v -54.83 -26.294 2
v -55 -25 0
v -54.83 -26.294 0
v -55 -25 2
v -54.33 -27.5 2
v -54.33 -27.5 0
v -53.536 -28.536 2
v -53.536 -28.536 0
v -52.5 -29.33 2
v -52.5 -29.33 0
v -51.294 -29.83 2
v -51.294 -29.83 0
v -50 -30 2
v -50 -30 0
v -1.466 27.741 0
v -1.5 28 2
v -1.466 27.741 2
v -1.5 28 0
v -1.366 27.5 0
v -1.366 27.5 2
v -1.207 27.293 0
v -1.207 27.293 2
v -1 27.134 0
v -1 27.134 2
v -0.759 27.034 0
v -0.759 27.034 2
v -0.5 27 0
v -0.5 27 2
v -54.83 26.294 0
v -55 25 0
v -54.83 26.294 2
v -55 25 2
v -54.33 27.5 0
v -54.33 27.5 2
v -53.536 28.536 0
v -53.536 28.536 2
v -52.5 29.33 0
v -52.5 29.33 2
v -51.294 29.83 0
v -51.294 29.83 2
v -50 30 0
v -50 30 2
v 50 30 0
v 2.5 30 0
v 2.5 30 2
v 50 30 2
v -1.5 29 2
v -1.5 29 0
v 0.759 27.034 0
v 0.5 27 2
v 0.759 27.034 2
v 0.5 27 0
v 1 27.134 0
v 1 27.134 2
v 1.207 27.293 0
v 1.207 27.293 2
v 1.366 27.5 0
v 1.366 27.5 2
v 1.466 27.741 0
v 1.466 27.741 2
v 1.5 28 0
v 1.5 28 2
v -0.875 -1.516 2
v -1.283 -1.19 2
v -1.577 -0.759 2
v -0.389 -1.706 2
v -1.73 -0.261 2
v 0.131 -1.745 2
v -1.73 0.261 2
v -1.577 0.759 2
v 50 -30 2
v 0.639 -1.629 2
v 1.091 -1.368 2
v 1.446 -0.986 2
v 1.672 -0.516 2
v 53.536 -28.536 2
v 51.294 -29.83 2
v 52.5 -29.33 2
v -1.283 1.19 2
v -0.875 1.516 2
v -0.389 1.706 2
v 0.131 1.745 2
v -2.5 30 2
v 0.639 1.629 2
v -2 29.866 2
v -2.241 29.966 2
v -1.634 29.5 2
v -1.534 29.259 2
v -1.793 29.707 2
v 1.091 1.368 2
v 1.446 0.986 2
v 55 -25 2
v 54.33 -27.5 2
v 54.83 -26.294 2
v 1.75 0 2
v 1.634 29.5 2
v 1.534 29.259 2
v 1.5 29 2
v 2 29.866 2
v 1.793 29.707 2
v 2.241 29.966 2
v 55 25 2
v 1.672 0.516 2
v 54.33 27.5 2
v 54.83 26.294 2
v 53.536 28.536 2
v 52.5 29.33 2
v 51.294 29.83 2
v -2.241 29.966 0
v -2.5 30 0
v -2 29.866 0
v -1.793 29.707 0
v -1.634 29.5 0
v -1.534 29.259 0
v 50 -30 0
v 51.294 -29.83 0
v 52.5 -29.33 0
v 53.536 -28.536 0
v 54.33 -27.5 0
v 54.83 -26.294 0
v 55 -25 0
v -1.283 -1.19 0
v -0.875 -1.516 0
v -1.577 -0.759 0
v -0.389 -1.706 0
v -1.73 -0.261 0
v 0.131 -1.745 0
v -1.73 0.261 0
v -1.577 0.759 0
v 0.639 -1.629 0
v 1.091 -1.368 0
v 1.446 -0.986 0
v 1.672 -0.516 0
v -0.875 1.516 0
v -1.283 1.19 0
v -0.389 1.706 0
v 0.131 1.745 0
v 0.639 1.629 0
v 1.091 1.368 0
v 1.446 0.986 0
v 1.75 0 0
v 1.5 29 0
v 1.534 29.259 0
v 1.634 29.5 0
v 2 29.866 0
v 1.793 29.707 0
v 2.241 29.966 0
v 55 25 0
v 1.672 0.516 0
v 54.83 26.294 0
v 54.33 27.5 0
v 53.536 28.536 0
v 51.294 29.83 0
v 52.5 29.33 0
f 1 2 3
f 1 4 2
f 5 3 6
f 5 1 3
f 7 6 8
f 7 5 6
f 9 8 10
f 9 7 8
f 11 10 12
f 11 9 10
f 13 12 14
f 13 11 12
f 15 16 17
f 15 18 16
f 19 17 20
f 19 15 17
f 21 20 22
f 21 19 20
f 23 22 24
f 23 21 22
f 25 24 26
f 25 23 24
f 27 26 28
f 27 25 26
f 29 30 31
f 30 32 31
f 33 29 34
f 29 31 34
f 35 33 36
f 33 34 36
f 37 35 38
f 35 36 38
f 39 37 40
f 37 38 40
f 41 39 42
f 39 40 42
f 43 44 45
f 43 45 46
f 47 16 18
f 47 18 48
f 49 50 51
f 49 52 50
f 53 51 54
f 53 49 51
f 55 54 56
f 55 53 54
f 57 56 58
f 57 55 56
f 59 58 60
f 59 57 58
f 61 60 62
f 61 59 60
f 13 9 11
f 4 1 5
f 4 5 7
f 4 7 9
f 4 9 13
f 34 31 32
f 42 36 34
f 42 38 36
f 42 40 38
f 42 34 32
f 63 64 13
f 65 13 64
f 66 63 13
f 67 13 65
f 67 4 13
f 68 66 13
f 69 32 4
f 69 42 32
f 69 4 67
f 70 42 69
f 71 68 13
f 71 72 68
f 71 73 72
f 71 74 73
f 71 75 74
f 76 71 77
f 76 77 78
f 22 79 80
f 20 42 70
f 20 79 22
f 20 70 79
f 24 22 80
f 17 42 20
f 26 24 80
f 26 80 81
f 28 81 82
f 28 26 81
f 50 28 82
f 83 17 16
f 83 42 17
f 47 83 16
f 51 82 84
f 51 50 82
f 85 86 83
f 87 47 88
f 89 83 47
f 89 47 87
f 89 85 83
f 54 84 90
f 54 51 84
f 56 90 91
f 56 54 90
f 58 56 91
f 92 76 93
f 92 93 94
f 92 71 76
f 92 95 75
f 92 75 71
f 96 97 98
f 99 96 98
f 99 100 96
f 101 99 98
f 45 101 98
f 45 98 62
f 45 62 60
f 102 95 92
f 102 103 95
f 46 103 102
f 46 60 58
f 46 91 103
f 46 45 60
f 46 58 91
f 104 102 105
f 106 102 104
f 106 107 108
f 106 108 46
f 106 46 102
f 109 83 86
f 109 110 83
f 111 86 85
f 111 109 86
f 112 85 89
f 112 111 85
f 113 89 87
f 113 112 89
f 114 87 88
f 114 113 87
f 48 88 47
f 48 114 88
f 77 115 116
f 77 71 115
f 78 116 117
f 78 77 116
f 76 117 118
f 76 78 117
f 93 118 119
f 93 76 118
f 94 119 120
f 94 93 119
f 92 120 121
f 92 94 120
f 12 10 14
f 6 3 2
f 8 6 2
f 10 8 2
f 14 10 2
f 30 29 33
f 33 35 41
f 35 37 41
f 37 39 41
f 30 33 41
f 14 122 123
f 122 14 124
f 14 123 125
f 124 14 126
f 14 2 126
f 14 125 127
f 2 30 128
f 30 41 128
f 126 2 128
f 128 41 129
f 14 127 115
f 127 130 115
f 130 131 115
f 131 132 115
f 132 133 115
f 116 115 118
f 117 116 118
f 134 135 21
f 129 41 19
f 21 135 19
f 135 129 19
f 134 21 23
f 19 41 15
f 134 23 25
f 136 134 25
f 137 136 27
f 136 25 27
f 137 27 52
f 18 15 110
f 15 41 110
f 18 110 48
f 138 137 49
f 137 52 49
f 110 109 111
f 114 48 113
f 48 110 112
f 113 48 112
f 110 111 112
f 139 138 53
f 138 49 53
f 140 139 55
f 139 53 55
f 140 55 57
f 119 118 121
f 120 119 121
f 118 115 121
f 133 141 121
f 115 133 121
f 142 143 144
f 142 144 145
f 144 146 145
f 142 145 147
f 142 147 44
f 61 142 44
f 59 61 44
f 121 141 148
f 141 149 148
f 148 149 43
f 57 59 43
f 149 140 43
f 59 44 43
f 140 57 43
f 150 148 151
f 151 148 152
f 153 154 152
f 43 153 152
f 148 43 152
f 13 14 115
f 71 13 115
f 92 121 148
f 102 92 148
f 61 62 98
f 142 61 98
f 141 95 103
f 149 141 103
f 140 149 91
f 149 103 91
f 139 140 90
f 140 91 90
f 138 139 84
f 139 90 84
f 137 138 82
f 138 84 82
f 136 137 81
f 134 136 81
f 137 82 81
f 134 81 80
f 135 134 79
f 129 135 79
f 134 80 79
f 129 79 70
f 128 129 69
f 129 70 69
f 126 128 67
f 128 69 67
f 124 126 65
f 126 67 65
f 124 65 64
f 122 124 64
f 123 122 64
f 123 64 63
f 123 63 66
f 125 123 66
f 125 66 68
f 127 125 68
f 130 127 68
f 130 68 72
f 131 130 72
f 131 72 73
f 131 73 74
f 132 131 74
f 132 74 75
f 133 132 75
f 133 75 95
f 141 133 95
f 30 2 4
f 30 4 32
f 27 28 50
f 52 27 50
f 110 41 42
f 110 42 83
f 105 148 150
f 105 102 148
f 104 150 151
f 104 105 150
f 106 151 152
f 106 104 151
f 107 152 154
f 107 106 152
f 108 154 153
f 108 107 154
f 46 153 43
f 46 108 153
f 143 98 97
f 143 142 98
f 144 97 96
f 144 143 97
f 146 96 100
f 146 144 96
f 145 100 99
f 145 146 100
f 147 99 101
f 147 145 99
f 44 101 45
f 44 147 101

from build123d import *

# Parameters (mm, degrees)
F0_W     = 110
F0_H     = 60
F1_DEPTH = 2
F2_R     = 5
F3_W     = 3
F3_H     = 3
F4_DEPTH = 25
F5_R     = 1
F6_R     = 1.75
F7_DEPTH = 25


with BuildPart() as f1:
    # F0 (on Top) → F1 (new body)
    with BuildSketch(Plane.XY):
        Rectangle(F0_W, F0_H)
    extrude(amount=F1_DEPTH)

    # F2
    f2_edges = [f1.edges().sort_by_distance(p)[0] for p in [
        (55, -30, 1),
        (55, 30, 1),
        (-55, 30, 1),
        (-55, -30, 1),
    ]]
    fillet(f2_edges, radius=F2_R)

    # F3 (on face) → F4 (cut)
    with BuildSketch(Plane.XY.offset(2)):
        with Locations((0, 28.5)):
            Rectangle(F3_W, F3_H)
    extrude(amount=-F4_DEPTH, mode=Mode.SUBTRACT)

    # F5
    f5_edges = [f1.edges().sort_by_distance(p)[0] for p in [
        (-1.5, 30, 1),
        (-1.5, 27, 1),
        (1.5, 27, 1),
        (1.5, 30, 1),
    ]]
    fillet(f5_edges, radius=F5_R)

    # F6 (on face) → F7 (cut)
    with BuildSketch(Plane.XY.offset(2)):
        Circle(F6_R)
    extrude(amount=-F7_DEPTH, mode=Mode.SUBTRACT)


solid = f1.part
